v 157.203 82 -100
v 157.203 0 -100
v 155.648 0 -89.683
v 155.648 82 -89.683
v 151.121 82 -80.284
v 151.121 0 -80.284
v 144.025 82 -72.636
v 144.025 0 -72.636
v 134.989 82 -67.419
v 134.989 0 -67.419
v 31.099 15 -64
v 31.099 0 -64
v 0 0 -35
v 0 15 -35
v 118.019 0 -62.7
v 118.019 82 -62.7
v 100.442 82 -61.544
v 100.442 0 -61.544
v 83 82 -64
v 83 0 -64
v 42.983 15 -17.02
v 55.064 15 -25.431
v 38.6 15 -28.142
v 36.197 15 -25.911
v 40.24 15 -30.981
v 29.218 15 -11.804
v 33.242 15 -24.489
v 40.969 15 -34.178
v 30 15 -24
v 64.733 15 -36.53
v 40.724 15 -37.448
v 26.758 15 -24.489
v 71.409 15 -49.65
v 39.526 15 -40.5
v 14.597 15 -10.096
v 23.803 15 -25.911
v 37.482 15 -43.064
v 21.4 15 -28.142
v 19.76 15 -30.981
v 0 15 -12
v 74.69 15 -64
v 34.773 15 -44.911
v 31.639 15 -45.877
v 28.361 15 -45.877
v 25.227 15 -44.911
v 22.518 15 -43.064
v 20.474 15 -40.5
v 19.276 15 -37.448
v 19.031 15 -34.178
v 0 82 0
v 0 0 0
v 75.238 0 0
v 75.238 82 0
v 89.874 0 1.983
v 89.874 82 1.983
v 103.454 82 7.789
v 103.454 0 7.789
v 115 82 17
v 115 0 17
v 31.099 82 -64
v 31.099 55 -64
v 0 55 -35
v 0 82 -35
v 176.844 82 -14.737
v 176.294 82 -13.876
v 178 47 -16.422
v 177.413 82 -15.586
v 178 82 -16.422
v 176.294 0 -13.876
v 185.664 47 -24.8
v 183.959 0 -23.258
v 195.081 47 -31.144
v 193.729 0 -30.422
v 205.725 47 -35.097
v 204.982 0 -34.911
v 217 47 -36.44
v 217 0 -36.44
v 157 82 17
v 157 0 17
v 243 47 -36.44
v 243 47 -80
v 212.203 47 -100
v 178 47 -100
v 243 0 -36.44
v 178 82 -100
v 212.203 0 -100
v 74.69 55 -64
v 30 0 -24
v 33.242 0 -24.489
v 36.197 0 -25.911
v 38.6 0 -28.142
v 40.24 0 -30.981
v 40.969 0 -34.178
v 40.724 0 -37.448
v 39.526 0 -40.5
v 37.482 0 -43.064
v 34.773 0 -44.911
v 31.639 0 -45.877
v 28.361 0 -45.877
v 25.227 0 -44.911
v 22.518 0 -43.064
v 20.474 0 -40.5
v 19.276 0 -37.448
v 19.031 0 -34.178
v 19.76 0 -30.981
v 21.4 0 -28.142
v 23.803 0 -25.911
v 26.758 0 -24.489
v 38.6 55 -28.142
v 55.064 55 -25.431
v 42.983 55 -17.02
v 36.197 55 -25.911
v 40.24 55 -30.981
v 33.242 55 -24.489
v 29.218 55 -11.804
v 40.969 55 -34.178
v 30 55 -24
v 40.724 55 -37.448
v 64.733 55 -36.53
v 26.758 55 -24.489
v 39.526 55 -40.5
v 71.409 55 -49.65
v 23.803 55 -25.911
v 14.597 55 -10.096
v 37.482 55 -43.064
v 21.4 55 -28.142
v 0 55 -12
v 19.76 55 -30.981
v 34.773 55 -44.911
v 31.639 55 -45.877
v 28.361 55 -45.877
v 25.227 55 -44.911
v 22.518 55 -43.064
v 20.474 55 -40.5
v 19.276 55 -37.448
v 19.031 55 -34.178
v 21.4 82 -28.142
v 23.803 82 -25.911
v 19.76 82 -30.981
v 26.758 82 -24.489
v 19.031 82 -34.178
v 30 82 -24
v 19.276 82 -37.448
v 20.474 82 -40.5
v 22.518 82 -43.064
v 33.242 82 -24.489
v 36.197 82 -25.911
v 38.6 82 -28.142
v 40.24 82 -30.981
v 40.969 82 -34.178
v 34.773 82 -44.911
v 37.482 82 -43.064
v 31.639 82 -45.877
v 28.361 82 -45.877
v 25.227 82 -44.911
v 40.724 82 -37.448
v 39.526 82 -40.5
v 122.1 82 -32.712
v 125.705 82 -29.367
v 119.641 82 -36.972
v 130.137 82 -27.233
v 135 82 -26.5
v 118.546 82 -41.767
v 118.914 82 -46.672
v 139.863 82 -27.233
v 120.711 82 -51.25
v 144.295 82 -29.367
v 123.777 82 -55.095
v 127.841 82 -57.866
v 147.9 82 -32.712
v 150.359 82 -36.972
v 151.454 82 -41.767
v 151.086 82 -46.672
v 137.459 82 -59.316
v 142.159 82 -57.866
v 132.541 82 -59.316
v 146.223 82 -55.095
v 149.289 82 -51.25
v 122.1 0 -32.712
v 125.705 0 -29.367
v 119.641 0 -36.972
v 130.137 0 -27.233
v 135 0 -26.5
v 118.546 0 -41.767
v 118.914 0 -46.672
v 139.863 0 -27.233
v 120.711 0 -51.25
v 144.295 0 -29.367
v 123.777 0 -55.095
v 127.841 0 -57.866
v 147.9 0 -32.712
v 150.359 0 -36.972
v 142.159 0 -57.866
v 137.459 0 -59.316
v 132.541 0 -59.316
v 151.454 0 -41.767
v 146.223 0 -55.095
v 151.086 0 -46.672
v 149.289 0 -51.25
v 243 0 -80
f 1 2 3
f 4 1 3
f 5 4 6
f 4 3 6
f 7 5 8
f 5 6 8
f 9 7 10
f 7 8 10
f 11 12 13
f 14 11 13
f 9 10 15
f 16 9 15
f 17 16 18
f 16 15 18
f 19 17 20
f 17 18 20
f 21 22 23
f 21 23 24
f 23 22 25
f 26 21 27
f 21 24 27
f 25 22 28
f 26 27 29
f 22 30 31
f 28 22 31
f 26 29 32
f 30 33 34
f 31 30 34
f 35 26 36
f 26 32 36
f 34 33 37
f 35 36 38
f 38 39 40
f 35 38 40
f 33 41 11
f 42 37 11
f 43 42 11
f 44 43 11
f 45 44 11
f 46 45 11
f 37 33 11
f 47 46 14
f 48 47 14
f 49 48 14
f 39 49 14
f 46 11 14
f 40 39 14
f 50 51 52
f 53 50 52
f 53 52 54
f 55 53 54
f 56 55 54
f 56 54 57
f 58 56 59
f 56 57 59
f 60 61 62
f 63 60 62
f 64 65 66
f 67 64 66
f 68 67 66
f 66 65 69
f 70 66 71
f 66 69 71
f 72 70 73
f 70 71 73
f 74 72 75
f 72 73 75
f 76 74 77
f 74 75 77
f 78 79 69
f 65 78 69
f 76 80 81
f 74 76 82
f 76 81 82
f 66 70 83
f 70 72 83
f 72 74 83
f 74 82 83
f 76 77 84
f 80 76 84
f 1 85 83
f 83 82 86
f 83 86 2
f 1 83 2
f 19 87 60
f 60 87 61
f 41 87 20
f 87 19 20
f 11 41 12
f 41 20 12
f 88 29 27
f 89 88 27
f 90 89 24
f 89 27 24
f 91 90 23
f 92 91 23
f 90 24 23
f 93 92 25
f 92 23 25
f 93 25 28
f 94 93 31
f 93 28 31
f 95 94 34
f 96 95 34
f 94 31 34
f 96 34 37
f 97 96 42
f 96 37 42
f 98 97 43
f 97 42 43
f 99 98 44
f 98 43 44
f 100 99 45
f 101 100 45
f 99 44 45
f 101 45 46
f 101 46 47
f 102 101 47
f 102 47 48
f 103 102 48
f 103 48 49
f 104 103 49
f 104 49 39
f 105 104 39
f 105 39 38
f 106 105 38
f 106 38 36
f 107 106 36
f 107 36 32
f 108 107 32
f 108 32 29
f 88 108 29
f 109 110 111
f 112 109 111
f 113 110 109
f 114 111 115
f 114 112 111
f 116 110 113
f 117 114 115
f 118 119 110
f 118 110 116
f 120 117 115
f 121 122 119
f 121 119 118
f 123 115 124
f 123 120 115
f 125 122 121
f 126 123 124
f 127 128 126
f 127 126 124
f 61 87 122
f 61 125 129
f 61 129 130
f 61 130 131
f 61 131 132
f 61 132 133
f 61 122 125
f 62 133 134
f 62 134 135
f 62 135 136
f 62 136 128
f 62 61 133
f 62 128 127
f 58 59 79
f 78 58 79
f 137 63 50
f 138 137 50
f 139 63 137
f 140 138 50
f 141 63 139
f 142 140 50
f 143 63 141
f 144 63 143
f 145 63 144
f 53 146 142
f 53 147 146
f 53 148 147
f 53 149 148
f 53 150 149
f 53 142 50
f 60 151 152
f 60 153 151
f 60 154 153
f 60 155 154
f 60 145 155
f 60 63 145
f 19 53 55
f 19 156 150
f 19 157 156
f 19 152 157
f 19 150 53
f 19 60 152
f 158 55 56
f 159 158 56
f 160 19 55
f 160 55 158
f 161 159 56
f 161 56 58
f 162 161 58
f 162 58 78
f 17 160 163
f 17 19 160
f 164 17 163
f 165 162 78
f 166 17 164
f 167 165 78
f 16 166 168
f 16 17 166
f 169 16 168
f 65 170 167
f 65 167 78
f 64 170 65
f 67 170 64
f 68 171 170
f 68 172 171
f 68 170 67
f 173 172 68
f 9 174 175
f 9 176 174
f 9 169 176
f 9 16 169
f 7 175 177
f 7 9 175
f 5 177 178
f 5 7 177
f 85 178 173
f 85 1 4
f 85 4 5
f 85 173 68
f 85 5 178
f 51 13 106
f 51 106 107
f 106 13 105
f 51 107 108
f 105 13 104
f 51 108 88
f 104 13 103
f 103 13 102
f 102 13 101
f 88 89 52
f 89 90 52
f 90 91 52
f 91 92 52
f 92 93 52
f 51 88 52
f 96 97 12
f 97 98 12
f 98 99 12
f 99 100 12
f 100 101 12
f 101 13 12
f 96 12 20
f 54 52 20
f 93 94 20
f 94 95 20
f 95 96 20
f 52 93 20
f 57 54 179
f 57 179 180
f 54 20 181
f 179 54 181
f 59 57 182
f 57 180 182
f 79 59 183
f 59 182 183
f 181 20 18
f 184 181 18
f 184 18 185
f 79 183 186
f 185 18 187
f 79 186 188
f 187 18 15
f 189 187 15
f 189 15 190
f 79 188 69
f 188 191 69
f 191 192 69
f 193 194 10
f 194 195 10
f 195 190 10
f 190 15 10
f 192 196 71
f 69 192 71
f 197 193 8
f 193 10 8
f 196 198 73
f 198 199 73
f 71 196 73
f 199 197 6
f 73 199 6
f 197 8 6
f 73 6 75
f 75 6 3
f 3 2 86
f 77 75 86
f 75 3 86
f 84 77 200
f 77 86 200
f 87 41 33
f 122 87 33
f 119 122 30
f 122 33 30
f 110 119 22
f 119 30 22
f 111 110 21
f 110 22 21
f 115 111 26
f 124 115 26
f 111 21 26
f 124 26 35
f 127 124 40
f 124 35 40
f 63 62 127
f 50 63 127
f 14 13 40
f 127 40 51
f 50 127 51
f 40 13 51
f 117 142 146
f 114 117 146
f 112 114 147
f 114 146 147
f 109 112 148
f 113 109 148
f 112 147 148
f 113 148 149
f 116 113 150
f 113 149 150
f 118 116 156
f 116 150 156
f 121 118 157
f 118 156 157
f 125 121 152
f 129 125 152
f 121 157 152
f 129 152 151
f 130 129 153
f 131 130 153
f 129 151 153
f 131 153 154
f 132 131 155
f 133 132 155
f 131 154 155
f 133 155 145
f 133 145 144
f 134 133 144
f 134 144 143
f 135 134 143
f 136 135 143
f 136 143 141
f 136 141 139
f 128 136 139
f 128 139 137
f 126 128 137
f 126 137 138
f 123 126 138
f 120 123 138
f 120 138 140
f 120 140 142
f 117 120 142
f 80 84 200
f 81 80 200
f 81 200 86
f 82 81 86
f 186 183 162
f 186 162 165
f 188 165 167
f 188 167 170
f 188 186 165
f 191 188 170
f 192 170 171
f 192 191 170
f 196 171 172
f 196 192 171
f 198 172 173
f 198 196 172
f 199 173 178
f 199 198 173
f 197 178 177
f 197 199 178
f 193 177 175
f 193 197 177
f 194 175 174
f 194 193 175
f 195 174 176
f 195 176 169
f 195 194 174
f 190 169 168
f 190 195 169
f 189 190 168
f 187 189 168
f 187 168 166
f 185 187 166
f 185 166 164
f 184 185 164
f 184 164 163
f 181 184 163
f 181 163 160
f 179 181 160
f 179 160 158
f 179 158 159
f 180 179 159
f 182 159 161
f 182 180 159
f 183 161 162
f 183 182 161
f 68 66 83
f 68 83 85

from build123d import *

# Parameters (mm, degrees)
SKETCH1_R           = 16.5
BOSS_EXTRUDE1_DEPTH = 82
SKETCH2_R           = 11
CUT_EXTRUDE1_DEPTH  = 276.268959383
SKETCH5_W           = 65
SKETCH5_H           = 35
CUT_EXTRUDE2_DEPTH  = 282.890049487
CUT_EXTRUDE3_DEPTH  = 40


with BuildPart() as part:
    # Sketch1 → Boss-Extrude1 (new body)
    with BuildSketch(Plane(origin=(0, 0, 0), x_dir=(1, 0, 0), z_dir=(0, 1, 0))):
        with BuildLine():
            Line((212.202700724, 100), (157.202700724, 100))
            ThreePointArc((157.202700724, 100), (151.120923095, 80.283600356), (134.9891913, 67.419244043))
            ThreePointArc((134.9891913, 67.419244043), (109.260251558, 61.670356138), (83, 64))
            Line((83, 64), (31.098692591, 64))
            Line((31.098692591, 64), (0, 35))
            Line((0, 35), (0, 0))
            Line((0, 0), (75.238209296, 0))
            ThreePointArc((75.238209296, 0), (96.859957606, -4.428268766), (115, -17))
            Line((115, -17), (157, -17))
            Line((157, -17), (176.293691384, 13.876360515))
            ThreePointArc((176.293691384, 13.876360515), (193.729138228, 30.421981775), (217, 36.440235832))
            Line((217, 36.440235832), (243, 36.440235832))
            Line((243, 36.440235832), (243, 80))
            Line((243, 80), (212.202700724, 100))
        make_face()
        with Locations(Location((135, 43, 0), (0, 0, 270))):
            Circle(SKETCH1_R, mode=Mode.SUBTRACT)
    extrude(amount=BOSS_EXTRUDE1_DEPTH)

    # Sketch2 → Cut-Extrude1 (cut, through all)
    with BuildSketch(Plane(origin=(0, 82, 0), x_dir=(1, 0, 0), z_dir=(0, 1, 0))):
        with Locations(Location((30, 35, 0), (0, 0, 270))):
            Circle(SKETCH2_R)
    extrude(amount=-CUT_EXTRUDE1_DEPTH, mode=Mode.SUBTRACT)

    # Sketch5 → Cut-Extrude2 (cut, through all)
    with BuildSketch(Plane(origin=(0, 0, -100), x_dir=(-1, 0, 0), z_dir=(0, 0, -1))):
        with Locations((-210.5, 64.5)):
            Rectangle(SKETCH5_W, SKETCH5_H)
    extrude(amount=-CUT_EXTRUDE2_DEPTH, mode=Mode.SUBTRACT)

    # Sketch6 → Cut-Extrude3 (cut)
    with BuildSketch(Plane(origin=(0, 15, 0), x_dir=(-1, 0, 0), z_dir=(0, -1, 0))):
        with BuildLine():
            Line((0, 12), (0, 35))
            Line((0, 35), (-31.098692591, 64))
            Line((-31.098692591, 64), (-74.689647512, 64))
            ThreePointArc((-74.689647512, 64), (-49.282519579, 20.85341744), (0, 12))
        make_face()
    extrude(amount=-CUT_EXTRUDE3_DEPTH, mode=Mode.SUBTRACT)


solid = part.part
